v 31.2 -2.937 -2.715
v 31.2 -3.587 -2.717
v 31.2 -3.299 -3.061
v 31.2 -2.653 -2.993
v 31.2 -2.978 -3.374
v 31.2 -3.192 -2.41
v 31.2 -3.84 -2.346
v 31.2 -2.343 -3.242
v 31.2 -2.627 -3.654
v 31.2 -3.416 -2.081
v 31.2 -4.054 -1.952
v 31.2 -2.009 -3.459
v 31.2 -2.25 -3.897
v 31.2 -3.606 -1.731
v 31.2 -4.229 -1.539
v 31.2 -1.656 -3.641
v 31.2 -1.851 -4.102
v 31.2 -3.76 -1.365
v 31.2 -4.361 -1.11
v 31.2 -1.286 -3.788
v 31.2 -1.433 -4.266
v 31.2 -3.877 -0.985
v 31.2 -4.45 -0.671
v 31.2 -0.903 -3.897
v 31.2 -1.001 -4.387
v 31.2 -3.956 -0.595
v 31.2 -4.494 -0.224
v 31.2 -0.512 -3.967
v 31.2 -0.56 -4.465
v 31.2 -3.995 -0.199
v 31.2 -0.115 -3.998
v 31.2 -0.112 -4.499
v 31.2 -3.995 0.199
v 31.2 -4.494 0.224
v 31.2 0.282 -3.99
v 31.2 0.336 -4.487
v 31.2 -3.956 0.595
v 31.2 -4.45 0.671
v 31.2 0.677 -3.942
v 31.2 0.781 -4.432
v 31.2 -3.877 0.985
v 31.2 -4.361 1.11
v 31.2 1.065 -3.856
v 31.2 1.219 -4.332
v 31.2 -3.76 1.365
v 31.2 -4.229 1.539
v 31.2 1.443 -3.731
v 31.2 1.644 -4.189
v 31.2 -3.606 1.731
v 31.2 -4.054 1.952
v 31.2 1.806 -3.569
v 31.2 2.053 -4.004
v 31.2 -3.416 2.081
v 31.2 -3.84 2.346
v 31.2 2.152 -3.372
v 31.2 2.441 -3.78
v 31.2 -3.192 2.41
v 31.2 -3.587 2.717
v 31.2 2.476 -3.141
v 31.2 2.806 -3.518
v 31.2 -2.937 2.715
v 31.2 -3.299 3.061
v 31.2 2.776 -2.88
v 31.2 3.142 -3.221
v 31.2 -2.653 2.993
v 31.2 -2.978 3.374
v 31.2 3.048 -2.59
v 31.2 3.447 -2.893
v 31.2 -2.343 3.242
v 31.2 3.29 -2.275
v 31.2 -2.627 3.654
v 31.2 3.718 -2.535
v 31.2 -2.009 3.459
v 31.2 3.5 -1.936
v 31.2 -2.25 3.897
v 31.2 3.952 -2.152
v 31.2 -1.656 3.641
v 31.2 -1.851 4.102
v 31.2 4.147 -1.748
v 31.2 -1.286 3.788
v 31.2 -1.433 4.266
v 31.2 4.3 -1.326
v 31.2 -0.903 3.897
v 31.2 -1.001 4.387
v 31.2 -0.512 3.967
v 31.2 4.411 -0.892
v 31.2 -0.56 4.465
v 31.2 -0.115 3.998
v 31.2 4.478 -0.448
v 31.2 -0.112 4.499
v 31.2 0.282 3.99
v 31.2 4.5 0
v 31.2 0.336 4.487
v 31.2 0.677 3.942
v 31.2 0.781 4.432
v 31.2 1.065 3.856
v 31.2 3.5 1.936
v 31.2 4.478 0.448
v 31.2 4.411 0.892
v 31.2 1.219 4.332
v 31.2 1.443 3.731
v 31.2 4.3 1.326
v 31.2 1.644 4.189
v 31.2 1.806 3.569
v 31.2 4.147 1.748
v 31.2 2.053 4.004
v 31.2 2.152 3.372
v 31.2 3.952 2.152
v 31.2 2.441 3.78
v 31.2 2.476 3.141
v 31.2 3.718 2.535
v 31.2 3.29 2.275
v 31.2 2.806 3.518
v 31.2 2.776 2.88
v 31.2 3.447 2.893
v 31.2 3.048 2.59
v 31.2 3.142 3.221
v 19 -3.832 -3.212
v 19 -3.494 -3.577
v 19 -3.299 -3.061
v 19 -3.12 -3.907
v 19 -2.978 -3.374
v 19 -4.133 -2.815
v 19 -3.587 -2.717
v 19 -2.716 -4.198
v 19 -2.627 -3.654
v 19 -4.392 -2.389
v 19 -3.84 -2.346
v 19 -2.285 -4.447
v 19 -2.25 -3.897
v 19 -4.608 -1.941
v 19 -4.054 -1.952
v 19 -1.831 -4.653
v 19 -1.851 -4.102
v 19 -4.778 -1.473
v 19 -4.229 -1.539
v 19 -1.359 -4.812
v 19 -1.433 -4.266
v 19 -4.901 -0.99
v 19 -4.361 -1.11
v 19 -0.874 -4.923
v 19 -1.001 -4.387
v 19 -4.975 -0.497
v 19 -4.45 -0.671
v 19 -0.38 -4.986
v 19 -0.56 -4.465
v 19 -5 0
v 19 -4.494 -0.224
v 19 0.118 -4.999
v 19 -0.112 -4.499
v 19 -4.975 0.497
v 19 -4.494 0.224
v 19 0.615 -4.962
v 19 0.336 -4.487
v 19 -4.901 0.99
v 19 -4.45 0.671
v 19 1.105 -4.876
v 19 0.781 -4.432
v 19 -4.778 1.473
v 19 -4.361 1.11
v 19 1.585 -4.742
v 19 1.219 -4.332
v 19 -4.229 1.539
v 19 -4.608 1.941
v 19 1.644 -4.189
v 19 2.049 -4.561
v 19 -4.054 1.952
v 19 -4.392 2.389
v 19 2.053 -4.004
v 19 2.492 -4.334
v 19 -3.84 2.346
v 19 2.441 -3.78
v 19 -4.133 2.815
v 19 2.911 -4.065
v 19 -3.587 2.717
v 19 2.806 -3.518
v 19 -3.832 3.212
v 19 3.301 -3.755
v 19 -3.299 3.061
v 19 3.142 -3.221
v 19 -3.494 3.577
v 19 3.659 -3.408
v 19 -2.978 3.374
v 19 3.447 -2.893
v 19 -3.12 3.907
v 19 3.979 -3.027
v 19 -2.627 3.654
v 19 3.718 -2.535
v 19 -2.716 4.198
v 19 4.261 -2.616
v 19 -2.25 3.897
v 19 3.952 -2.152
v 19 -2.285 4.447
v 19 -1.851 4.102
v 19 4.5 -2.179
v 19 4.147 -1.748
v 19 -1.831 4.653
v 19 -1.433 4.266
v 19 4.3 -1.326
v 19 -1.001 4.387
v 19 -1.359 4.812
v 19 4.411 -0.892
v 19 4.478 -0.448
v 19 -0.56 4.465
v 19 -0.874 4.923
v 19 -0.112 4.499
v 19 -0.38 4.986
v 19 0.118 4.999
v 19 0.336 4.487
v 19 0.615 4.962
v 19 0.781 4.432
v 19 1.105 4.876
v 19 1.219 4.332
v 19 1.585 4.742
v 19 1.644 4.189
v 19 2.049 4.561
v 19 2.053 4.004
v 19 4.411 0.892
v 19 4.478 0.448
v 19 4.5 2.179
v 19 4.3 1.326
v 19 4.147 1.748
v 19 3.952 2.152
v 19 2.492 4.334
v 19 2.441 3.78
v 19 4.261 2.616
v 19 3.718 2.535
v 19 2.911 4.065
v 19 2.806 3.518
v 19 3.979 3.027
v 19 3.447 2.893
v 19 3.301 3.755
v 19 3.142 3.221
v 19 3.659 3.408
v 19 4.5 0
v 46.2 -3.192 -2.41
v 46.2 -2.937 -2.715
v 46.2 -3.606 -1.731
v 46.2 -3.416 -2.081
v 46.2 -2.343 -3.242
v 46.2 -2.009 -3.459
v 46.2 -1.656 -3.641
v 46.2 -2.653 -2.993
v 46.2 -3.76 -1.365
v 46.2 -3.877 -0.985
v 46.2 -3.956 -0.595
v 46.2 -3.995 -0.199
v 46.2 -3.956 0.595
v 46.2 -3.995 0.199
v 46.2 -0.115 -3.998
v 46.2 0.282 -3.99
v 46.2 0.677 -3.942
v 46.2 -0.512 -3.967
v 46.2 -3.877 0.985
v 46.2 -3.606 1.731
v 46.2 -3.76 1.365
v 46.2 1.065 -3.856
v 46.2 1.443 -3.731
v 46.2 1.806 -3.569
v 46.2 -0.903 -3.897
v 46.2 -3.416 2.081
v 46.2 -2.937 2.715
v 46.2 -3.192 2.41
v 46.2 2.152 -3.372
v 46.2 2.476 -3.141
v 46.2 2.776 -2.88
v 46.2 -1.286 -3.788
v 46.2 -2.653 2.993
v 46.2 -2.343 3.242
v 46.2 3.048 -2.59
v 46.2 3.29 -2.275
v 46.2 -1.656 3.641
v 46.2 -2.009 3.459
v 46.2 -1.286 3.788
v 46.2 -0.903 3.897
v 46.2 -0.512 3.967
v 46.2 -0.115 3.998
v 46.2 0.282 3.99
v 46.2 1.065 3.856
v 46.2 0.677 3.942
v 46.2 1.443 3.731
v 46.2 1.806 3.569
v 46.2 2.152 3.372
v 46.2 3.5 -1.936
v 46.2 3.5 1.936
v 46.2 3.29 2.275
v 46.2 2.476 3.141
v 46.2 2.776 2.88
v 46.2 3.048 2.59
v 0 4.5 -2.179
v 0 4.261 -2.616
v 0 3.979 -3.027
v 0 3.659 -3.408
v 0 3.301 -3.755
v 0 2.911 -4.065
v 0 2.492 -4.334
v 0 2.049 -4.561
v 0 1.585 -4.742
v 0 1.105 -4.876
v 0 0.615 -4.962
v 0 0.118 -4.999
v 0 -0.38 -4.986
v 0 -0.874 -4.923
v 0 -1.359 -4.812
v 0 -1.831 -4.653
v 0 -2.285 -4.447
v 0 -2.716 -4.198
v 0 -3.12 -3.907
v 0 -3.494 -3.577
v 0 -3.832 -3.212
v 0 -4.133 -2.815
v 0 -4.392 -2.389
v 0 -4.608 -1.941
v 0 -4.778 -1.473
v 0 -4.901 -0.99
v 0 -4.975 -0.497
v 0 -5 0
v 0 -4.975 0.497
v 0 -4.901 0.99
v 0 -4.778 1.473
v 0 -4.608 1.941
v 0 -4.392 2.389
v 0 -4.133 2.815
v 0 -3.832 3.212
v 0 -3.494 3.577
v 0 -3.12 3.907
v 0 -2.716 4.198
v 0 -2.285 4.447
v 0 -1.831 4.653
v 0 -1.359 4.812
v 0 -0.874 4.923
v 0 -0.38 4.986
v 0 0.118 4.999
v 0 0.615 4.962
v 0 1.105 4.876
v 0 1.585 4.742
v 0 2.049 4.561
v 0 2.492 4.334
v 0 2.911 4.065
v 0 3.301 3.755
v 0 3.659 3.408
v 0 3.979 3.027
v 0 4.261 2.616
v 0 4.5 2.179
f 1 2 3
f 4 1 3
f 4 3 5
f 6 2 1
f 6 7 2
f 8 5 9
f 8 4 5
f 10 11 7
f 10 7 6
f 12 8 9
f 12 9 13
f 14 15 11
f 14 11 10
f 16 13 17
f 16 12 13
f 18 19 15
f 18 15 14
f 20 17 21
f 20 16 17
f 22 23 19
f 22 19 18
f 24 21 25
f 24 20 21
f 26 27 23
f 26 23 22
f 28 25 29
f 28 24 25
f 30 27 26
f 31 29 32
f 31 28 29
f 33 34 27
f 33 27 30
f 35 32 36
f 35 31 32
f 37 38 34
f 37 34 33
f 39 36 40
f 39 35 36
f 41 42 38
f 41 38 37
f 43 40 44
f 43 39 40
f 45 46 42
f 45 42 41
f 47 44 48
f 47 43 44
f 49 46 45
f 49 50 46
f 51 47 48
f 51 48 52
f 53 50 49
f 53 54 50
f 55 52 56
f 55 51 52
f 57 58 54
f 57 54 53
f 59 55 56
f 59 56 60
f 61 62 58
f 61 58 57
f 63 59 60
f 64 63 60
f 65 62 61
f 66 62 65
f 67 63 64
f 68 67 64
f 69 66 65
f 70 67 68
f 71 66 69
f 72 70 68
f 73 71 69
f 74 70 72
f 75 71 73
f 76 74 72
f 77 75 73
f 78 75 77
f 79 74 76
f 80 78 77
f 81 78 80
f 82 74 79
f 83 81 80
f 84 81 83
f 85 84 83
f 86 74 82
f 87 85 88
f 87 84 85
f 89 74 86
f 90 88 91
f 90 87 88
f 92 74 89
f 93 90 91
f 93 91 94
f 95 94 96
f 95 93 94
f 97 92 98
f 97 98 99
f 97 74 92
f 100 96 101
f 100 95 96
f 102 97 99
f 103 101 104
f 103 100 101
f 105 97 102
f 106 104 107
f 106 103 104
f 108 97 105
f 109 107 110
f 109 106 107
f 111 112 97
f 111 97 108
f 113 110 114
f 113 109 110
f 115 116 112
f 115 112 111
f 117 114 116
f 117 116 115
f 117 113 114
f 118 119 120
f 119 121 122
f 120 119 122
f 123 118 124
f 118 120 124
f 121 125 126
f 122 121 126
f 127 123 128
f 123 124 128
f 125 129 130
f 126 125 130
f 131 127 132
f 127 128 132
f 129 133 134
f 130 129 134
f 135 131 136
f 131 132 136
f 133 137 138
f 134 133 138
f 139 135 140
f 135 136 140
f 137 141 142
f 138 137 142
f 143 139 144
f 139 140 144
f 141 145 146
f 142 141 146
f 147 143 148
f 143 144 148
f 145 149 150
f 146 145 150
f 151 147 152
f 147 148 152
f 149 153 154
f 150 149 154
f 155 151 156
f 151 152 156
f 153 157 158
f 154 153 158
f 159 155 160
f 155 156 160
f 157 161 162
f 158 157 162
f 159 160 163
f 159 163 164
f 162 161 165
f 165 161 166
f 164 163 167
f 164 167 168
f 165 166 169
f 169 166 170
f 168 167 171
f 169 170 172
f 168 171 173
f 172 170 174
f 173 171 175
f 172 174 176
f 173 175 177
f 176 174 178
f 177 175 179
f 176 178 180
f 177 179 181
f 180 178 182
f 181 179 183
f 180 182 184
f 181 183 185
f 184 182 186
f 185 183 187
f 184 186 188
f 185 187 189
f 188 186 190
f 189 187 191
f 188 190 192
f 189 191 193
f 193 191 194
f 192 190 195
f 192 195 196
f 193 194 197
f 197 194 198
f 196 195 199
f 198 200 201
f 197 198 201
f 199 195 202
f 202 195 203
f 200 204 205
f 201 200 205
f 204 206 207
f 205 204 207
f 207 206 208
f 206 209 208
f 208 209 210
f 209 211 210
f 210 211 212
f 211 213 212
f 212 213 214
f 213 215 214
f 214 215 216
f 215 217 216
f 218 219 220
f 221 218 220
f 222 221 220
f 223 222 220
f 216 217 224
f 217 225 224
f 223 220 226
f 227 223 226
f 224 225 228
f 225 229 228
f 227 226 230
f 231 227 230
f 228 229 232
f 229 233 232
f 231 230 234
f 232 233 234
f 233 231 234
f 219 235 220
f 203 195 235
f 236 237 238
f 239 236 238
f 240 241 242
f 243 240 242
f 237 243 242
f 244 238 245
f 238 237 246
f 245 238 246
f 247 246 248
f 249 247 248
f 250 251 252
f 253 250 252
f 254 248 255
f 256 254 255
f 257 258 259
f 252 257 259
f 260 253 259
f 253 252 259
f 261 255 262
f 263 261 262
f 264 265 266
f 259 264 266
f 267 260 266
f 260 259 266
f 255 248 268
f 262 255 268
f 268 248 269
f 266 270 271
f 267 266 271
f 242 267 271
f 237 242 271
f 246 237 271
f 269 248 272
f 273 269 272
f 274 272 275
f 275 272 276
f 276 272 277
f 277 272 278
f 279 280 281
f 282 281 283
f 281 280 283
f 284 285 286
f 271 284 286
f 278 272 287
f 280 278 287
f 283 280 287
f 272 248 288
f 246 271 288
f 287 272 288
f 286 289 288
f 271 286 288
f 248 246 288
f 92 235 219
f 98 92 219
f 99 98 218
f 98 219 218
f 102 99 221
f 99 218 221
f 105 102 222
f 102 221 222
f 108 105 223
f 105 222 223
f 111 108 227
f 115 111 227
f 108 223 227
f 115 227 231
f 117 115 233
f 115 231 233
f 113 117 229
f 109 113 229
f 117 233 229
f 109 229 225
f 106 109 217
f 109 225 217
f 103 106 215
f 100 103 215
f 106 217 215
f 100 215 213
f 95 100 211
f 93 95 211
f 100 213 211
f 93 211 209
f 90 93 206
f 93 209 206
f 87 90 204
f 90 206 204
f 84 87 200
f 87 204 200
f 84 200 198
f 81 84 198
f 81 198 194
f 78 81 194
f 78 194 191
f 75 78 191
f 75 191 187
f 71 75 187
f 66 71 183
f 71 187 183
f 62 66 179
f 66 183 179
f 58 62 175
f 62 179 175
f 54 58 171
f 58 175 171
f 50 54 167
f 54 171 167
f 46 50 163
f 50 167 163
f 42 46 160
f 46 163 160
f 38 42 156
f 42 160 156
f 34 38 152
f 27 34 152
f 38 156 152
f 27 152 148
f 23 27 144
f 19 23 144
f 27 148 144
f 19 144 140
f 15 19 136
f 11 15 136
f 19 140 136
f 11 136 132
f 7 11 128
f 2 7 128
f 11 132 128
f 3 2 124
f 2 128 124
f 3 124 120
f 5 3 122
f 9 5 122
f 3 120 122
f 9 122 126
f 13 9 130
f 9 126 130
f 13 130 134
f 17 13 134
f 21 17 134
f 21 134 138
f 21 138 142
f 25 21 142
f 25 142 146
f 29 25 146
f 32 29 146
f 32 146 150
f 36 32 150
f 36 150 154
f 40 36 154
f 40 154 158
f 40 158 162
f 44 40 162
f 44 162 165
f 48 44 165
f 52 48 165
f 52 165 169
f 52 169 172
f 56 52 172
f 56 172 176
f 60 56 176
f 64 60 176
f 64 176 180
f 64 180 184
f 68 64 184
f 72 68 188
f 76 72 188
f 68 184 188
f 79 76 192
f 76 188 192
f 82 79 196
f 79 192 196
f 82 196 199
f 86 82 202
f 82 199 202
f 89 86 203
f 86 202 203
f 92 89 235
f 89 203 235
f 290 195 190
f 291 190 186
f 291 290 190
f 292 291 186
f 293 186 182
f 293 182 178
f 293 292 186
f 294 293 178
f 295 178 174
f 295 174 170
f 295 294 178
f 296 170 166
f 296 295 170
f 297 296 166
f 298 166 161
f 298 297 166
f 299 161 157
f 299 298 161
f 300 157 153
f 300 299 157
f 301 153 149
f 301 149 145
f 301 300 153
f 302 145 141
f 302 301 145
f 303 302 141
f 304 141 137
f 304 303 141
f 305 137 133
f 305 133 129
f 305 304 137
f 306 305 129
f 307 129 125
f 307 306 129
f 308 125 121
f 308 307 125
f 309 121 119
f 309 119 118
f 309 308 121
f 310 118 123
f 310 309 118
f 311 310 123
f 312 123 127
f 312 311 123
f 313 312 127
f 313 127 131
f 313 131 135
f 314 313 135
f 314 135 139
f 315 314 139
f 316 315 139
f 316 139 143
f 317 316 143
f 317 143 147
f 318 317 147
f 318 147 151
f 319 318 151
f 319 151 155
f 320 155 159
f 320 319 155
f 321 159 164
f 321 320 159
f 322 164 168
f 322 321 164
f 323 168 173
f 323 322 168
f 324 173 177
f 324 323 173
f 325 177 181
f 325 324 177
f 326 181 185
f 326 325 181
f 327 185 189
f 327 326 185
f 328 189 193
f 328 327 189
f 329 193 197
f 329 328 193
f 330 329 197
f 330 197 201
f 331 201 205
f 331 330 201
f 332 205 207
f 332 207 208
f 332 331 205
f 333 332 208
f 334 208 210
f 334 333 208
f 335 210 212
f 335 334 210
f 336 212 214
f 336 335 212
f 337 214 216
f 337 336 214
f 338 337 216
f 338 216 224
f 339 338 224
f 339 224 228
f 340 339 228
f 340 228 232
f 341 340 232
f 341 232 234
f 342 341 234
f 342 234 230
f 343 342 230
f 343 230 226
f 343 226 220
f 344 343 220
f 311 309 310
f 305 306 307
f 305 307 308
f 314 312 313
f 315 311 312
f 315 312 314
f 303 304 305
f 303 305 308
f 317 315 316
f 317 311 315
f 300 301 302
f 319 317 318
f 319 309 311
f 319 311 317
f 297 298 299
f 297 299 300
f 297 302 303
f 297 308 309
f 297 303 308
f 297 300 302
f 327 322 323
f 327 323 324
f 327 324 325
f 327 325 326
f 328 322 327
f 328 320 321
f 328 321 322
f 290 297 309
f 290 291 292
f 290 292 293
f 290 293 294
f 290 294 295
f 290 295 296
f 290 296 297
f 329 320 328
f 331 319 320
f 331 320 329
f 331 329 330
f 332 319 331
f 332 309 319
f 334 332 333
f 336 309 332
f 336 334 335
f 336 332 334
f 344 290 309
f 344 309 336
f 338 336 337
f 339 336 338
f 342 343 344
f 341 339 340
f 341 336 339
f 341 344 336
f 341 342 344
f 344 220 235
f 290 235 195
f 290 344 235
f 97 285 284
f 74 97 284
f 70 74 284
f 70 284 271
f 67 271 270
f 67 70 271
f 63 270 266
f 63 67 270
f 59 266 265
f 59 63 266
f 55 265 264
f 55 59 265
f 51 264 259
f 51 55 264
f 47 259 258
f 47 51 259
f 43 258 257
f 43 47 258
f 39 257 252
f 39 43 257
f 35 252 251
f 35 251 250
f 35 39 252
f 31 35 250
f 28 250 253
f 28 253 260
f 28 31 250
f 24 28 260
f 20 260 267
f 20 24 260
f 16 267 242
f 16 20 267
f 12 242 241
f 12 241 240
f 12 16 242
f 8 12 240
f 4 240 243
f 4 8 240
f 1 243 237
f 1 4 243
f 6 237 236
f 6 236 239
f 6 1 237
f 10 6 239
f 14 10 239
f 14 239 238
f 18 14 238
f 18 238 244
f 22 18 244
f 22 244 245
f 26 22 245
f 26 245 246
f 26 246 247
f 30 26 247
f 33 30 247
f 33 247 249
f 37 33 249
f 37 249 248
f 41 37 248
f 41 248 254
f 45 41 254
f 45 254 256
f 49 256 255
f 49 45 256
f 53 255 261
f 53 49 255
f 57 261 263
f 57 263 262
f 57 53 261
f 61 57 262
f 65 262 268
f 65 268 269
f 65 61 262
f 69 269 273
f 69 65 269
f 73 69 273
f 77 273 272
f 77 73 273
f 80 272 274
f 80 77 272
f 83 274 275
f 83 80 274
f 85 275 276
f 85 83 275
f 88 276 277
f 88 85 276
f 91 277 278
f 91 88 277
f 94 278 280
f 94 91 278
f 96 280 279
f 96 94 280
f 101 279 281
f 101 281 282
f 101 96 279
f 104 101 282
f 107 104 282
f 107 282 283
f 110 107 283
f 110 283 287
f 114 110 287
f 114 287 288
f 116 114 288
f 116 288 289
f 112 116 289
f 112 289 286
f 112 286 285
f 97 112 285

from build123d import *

# Parameters (mm, degrees)
EXTRUDE_1_DEPTH = 19
SKETCH_2_R      = 4.5
EXTRUDE_2_DEPTH = 12.2
EXTRUDE_3_DEPTH = 15


with BuildPart() as part:
    # 草图1 → 拉伸1 (new body)
    with BuildSketch(Plane(origin=(0, 0, 0), x_dir=(0, 0, -1), z_dir=(1, 0, 0))):
        with BuildLine():
            Line((-2.179449472, 4.5), (2.179449472, 4.5))
            ThreePointArc((2.179449472, 4.5), (0, -5), (-2.179449472, 4.5))
        make_face()
    extrude(amount=EXTRUDE_1_DEPTH)

    # 草图2 → 拉伸2 (add)
    with BuildSketch(Plane(origin=(19, 0, 0), x_dir=(0, 0, -1), z_dir=(1, 0, 0))):
        with Locations(Location((0, 0, 0), (0, 0, 90))):
            Circle(SKETCH_2_R)
    extrude(amount=EXTRUDE_2_DEPTH)

    # 草图3 → 拉伸3 (add)
    with BuildSketch(Plane(origin=(31.2, 0, 0), x_dir=(0, 0, -1), z_dir=(1, 0, 0))):
        with BuildLine():
            Line((-1.936491673, 3.5), (1.936491673, 3.5))
            ThreePointArc((1.936491673, 3.5), (0, -4), (-1.936491673, 3.5))
        make_face()
    extrude(amount=EXTRUDE_3_DEPTH)


solid = part.part
